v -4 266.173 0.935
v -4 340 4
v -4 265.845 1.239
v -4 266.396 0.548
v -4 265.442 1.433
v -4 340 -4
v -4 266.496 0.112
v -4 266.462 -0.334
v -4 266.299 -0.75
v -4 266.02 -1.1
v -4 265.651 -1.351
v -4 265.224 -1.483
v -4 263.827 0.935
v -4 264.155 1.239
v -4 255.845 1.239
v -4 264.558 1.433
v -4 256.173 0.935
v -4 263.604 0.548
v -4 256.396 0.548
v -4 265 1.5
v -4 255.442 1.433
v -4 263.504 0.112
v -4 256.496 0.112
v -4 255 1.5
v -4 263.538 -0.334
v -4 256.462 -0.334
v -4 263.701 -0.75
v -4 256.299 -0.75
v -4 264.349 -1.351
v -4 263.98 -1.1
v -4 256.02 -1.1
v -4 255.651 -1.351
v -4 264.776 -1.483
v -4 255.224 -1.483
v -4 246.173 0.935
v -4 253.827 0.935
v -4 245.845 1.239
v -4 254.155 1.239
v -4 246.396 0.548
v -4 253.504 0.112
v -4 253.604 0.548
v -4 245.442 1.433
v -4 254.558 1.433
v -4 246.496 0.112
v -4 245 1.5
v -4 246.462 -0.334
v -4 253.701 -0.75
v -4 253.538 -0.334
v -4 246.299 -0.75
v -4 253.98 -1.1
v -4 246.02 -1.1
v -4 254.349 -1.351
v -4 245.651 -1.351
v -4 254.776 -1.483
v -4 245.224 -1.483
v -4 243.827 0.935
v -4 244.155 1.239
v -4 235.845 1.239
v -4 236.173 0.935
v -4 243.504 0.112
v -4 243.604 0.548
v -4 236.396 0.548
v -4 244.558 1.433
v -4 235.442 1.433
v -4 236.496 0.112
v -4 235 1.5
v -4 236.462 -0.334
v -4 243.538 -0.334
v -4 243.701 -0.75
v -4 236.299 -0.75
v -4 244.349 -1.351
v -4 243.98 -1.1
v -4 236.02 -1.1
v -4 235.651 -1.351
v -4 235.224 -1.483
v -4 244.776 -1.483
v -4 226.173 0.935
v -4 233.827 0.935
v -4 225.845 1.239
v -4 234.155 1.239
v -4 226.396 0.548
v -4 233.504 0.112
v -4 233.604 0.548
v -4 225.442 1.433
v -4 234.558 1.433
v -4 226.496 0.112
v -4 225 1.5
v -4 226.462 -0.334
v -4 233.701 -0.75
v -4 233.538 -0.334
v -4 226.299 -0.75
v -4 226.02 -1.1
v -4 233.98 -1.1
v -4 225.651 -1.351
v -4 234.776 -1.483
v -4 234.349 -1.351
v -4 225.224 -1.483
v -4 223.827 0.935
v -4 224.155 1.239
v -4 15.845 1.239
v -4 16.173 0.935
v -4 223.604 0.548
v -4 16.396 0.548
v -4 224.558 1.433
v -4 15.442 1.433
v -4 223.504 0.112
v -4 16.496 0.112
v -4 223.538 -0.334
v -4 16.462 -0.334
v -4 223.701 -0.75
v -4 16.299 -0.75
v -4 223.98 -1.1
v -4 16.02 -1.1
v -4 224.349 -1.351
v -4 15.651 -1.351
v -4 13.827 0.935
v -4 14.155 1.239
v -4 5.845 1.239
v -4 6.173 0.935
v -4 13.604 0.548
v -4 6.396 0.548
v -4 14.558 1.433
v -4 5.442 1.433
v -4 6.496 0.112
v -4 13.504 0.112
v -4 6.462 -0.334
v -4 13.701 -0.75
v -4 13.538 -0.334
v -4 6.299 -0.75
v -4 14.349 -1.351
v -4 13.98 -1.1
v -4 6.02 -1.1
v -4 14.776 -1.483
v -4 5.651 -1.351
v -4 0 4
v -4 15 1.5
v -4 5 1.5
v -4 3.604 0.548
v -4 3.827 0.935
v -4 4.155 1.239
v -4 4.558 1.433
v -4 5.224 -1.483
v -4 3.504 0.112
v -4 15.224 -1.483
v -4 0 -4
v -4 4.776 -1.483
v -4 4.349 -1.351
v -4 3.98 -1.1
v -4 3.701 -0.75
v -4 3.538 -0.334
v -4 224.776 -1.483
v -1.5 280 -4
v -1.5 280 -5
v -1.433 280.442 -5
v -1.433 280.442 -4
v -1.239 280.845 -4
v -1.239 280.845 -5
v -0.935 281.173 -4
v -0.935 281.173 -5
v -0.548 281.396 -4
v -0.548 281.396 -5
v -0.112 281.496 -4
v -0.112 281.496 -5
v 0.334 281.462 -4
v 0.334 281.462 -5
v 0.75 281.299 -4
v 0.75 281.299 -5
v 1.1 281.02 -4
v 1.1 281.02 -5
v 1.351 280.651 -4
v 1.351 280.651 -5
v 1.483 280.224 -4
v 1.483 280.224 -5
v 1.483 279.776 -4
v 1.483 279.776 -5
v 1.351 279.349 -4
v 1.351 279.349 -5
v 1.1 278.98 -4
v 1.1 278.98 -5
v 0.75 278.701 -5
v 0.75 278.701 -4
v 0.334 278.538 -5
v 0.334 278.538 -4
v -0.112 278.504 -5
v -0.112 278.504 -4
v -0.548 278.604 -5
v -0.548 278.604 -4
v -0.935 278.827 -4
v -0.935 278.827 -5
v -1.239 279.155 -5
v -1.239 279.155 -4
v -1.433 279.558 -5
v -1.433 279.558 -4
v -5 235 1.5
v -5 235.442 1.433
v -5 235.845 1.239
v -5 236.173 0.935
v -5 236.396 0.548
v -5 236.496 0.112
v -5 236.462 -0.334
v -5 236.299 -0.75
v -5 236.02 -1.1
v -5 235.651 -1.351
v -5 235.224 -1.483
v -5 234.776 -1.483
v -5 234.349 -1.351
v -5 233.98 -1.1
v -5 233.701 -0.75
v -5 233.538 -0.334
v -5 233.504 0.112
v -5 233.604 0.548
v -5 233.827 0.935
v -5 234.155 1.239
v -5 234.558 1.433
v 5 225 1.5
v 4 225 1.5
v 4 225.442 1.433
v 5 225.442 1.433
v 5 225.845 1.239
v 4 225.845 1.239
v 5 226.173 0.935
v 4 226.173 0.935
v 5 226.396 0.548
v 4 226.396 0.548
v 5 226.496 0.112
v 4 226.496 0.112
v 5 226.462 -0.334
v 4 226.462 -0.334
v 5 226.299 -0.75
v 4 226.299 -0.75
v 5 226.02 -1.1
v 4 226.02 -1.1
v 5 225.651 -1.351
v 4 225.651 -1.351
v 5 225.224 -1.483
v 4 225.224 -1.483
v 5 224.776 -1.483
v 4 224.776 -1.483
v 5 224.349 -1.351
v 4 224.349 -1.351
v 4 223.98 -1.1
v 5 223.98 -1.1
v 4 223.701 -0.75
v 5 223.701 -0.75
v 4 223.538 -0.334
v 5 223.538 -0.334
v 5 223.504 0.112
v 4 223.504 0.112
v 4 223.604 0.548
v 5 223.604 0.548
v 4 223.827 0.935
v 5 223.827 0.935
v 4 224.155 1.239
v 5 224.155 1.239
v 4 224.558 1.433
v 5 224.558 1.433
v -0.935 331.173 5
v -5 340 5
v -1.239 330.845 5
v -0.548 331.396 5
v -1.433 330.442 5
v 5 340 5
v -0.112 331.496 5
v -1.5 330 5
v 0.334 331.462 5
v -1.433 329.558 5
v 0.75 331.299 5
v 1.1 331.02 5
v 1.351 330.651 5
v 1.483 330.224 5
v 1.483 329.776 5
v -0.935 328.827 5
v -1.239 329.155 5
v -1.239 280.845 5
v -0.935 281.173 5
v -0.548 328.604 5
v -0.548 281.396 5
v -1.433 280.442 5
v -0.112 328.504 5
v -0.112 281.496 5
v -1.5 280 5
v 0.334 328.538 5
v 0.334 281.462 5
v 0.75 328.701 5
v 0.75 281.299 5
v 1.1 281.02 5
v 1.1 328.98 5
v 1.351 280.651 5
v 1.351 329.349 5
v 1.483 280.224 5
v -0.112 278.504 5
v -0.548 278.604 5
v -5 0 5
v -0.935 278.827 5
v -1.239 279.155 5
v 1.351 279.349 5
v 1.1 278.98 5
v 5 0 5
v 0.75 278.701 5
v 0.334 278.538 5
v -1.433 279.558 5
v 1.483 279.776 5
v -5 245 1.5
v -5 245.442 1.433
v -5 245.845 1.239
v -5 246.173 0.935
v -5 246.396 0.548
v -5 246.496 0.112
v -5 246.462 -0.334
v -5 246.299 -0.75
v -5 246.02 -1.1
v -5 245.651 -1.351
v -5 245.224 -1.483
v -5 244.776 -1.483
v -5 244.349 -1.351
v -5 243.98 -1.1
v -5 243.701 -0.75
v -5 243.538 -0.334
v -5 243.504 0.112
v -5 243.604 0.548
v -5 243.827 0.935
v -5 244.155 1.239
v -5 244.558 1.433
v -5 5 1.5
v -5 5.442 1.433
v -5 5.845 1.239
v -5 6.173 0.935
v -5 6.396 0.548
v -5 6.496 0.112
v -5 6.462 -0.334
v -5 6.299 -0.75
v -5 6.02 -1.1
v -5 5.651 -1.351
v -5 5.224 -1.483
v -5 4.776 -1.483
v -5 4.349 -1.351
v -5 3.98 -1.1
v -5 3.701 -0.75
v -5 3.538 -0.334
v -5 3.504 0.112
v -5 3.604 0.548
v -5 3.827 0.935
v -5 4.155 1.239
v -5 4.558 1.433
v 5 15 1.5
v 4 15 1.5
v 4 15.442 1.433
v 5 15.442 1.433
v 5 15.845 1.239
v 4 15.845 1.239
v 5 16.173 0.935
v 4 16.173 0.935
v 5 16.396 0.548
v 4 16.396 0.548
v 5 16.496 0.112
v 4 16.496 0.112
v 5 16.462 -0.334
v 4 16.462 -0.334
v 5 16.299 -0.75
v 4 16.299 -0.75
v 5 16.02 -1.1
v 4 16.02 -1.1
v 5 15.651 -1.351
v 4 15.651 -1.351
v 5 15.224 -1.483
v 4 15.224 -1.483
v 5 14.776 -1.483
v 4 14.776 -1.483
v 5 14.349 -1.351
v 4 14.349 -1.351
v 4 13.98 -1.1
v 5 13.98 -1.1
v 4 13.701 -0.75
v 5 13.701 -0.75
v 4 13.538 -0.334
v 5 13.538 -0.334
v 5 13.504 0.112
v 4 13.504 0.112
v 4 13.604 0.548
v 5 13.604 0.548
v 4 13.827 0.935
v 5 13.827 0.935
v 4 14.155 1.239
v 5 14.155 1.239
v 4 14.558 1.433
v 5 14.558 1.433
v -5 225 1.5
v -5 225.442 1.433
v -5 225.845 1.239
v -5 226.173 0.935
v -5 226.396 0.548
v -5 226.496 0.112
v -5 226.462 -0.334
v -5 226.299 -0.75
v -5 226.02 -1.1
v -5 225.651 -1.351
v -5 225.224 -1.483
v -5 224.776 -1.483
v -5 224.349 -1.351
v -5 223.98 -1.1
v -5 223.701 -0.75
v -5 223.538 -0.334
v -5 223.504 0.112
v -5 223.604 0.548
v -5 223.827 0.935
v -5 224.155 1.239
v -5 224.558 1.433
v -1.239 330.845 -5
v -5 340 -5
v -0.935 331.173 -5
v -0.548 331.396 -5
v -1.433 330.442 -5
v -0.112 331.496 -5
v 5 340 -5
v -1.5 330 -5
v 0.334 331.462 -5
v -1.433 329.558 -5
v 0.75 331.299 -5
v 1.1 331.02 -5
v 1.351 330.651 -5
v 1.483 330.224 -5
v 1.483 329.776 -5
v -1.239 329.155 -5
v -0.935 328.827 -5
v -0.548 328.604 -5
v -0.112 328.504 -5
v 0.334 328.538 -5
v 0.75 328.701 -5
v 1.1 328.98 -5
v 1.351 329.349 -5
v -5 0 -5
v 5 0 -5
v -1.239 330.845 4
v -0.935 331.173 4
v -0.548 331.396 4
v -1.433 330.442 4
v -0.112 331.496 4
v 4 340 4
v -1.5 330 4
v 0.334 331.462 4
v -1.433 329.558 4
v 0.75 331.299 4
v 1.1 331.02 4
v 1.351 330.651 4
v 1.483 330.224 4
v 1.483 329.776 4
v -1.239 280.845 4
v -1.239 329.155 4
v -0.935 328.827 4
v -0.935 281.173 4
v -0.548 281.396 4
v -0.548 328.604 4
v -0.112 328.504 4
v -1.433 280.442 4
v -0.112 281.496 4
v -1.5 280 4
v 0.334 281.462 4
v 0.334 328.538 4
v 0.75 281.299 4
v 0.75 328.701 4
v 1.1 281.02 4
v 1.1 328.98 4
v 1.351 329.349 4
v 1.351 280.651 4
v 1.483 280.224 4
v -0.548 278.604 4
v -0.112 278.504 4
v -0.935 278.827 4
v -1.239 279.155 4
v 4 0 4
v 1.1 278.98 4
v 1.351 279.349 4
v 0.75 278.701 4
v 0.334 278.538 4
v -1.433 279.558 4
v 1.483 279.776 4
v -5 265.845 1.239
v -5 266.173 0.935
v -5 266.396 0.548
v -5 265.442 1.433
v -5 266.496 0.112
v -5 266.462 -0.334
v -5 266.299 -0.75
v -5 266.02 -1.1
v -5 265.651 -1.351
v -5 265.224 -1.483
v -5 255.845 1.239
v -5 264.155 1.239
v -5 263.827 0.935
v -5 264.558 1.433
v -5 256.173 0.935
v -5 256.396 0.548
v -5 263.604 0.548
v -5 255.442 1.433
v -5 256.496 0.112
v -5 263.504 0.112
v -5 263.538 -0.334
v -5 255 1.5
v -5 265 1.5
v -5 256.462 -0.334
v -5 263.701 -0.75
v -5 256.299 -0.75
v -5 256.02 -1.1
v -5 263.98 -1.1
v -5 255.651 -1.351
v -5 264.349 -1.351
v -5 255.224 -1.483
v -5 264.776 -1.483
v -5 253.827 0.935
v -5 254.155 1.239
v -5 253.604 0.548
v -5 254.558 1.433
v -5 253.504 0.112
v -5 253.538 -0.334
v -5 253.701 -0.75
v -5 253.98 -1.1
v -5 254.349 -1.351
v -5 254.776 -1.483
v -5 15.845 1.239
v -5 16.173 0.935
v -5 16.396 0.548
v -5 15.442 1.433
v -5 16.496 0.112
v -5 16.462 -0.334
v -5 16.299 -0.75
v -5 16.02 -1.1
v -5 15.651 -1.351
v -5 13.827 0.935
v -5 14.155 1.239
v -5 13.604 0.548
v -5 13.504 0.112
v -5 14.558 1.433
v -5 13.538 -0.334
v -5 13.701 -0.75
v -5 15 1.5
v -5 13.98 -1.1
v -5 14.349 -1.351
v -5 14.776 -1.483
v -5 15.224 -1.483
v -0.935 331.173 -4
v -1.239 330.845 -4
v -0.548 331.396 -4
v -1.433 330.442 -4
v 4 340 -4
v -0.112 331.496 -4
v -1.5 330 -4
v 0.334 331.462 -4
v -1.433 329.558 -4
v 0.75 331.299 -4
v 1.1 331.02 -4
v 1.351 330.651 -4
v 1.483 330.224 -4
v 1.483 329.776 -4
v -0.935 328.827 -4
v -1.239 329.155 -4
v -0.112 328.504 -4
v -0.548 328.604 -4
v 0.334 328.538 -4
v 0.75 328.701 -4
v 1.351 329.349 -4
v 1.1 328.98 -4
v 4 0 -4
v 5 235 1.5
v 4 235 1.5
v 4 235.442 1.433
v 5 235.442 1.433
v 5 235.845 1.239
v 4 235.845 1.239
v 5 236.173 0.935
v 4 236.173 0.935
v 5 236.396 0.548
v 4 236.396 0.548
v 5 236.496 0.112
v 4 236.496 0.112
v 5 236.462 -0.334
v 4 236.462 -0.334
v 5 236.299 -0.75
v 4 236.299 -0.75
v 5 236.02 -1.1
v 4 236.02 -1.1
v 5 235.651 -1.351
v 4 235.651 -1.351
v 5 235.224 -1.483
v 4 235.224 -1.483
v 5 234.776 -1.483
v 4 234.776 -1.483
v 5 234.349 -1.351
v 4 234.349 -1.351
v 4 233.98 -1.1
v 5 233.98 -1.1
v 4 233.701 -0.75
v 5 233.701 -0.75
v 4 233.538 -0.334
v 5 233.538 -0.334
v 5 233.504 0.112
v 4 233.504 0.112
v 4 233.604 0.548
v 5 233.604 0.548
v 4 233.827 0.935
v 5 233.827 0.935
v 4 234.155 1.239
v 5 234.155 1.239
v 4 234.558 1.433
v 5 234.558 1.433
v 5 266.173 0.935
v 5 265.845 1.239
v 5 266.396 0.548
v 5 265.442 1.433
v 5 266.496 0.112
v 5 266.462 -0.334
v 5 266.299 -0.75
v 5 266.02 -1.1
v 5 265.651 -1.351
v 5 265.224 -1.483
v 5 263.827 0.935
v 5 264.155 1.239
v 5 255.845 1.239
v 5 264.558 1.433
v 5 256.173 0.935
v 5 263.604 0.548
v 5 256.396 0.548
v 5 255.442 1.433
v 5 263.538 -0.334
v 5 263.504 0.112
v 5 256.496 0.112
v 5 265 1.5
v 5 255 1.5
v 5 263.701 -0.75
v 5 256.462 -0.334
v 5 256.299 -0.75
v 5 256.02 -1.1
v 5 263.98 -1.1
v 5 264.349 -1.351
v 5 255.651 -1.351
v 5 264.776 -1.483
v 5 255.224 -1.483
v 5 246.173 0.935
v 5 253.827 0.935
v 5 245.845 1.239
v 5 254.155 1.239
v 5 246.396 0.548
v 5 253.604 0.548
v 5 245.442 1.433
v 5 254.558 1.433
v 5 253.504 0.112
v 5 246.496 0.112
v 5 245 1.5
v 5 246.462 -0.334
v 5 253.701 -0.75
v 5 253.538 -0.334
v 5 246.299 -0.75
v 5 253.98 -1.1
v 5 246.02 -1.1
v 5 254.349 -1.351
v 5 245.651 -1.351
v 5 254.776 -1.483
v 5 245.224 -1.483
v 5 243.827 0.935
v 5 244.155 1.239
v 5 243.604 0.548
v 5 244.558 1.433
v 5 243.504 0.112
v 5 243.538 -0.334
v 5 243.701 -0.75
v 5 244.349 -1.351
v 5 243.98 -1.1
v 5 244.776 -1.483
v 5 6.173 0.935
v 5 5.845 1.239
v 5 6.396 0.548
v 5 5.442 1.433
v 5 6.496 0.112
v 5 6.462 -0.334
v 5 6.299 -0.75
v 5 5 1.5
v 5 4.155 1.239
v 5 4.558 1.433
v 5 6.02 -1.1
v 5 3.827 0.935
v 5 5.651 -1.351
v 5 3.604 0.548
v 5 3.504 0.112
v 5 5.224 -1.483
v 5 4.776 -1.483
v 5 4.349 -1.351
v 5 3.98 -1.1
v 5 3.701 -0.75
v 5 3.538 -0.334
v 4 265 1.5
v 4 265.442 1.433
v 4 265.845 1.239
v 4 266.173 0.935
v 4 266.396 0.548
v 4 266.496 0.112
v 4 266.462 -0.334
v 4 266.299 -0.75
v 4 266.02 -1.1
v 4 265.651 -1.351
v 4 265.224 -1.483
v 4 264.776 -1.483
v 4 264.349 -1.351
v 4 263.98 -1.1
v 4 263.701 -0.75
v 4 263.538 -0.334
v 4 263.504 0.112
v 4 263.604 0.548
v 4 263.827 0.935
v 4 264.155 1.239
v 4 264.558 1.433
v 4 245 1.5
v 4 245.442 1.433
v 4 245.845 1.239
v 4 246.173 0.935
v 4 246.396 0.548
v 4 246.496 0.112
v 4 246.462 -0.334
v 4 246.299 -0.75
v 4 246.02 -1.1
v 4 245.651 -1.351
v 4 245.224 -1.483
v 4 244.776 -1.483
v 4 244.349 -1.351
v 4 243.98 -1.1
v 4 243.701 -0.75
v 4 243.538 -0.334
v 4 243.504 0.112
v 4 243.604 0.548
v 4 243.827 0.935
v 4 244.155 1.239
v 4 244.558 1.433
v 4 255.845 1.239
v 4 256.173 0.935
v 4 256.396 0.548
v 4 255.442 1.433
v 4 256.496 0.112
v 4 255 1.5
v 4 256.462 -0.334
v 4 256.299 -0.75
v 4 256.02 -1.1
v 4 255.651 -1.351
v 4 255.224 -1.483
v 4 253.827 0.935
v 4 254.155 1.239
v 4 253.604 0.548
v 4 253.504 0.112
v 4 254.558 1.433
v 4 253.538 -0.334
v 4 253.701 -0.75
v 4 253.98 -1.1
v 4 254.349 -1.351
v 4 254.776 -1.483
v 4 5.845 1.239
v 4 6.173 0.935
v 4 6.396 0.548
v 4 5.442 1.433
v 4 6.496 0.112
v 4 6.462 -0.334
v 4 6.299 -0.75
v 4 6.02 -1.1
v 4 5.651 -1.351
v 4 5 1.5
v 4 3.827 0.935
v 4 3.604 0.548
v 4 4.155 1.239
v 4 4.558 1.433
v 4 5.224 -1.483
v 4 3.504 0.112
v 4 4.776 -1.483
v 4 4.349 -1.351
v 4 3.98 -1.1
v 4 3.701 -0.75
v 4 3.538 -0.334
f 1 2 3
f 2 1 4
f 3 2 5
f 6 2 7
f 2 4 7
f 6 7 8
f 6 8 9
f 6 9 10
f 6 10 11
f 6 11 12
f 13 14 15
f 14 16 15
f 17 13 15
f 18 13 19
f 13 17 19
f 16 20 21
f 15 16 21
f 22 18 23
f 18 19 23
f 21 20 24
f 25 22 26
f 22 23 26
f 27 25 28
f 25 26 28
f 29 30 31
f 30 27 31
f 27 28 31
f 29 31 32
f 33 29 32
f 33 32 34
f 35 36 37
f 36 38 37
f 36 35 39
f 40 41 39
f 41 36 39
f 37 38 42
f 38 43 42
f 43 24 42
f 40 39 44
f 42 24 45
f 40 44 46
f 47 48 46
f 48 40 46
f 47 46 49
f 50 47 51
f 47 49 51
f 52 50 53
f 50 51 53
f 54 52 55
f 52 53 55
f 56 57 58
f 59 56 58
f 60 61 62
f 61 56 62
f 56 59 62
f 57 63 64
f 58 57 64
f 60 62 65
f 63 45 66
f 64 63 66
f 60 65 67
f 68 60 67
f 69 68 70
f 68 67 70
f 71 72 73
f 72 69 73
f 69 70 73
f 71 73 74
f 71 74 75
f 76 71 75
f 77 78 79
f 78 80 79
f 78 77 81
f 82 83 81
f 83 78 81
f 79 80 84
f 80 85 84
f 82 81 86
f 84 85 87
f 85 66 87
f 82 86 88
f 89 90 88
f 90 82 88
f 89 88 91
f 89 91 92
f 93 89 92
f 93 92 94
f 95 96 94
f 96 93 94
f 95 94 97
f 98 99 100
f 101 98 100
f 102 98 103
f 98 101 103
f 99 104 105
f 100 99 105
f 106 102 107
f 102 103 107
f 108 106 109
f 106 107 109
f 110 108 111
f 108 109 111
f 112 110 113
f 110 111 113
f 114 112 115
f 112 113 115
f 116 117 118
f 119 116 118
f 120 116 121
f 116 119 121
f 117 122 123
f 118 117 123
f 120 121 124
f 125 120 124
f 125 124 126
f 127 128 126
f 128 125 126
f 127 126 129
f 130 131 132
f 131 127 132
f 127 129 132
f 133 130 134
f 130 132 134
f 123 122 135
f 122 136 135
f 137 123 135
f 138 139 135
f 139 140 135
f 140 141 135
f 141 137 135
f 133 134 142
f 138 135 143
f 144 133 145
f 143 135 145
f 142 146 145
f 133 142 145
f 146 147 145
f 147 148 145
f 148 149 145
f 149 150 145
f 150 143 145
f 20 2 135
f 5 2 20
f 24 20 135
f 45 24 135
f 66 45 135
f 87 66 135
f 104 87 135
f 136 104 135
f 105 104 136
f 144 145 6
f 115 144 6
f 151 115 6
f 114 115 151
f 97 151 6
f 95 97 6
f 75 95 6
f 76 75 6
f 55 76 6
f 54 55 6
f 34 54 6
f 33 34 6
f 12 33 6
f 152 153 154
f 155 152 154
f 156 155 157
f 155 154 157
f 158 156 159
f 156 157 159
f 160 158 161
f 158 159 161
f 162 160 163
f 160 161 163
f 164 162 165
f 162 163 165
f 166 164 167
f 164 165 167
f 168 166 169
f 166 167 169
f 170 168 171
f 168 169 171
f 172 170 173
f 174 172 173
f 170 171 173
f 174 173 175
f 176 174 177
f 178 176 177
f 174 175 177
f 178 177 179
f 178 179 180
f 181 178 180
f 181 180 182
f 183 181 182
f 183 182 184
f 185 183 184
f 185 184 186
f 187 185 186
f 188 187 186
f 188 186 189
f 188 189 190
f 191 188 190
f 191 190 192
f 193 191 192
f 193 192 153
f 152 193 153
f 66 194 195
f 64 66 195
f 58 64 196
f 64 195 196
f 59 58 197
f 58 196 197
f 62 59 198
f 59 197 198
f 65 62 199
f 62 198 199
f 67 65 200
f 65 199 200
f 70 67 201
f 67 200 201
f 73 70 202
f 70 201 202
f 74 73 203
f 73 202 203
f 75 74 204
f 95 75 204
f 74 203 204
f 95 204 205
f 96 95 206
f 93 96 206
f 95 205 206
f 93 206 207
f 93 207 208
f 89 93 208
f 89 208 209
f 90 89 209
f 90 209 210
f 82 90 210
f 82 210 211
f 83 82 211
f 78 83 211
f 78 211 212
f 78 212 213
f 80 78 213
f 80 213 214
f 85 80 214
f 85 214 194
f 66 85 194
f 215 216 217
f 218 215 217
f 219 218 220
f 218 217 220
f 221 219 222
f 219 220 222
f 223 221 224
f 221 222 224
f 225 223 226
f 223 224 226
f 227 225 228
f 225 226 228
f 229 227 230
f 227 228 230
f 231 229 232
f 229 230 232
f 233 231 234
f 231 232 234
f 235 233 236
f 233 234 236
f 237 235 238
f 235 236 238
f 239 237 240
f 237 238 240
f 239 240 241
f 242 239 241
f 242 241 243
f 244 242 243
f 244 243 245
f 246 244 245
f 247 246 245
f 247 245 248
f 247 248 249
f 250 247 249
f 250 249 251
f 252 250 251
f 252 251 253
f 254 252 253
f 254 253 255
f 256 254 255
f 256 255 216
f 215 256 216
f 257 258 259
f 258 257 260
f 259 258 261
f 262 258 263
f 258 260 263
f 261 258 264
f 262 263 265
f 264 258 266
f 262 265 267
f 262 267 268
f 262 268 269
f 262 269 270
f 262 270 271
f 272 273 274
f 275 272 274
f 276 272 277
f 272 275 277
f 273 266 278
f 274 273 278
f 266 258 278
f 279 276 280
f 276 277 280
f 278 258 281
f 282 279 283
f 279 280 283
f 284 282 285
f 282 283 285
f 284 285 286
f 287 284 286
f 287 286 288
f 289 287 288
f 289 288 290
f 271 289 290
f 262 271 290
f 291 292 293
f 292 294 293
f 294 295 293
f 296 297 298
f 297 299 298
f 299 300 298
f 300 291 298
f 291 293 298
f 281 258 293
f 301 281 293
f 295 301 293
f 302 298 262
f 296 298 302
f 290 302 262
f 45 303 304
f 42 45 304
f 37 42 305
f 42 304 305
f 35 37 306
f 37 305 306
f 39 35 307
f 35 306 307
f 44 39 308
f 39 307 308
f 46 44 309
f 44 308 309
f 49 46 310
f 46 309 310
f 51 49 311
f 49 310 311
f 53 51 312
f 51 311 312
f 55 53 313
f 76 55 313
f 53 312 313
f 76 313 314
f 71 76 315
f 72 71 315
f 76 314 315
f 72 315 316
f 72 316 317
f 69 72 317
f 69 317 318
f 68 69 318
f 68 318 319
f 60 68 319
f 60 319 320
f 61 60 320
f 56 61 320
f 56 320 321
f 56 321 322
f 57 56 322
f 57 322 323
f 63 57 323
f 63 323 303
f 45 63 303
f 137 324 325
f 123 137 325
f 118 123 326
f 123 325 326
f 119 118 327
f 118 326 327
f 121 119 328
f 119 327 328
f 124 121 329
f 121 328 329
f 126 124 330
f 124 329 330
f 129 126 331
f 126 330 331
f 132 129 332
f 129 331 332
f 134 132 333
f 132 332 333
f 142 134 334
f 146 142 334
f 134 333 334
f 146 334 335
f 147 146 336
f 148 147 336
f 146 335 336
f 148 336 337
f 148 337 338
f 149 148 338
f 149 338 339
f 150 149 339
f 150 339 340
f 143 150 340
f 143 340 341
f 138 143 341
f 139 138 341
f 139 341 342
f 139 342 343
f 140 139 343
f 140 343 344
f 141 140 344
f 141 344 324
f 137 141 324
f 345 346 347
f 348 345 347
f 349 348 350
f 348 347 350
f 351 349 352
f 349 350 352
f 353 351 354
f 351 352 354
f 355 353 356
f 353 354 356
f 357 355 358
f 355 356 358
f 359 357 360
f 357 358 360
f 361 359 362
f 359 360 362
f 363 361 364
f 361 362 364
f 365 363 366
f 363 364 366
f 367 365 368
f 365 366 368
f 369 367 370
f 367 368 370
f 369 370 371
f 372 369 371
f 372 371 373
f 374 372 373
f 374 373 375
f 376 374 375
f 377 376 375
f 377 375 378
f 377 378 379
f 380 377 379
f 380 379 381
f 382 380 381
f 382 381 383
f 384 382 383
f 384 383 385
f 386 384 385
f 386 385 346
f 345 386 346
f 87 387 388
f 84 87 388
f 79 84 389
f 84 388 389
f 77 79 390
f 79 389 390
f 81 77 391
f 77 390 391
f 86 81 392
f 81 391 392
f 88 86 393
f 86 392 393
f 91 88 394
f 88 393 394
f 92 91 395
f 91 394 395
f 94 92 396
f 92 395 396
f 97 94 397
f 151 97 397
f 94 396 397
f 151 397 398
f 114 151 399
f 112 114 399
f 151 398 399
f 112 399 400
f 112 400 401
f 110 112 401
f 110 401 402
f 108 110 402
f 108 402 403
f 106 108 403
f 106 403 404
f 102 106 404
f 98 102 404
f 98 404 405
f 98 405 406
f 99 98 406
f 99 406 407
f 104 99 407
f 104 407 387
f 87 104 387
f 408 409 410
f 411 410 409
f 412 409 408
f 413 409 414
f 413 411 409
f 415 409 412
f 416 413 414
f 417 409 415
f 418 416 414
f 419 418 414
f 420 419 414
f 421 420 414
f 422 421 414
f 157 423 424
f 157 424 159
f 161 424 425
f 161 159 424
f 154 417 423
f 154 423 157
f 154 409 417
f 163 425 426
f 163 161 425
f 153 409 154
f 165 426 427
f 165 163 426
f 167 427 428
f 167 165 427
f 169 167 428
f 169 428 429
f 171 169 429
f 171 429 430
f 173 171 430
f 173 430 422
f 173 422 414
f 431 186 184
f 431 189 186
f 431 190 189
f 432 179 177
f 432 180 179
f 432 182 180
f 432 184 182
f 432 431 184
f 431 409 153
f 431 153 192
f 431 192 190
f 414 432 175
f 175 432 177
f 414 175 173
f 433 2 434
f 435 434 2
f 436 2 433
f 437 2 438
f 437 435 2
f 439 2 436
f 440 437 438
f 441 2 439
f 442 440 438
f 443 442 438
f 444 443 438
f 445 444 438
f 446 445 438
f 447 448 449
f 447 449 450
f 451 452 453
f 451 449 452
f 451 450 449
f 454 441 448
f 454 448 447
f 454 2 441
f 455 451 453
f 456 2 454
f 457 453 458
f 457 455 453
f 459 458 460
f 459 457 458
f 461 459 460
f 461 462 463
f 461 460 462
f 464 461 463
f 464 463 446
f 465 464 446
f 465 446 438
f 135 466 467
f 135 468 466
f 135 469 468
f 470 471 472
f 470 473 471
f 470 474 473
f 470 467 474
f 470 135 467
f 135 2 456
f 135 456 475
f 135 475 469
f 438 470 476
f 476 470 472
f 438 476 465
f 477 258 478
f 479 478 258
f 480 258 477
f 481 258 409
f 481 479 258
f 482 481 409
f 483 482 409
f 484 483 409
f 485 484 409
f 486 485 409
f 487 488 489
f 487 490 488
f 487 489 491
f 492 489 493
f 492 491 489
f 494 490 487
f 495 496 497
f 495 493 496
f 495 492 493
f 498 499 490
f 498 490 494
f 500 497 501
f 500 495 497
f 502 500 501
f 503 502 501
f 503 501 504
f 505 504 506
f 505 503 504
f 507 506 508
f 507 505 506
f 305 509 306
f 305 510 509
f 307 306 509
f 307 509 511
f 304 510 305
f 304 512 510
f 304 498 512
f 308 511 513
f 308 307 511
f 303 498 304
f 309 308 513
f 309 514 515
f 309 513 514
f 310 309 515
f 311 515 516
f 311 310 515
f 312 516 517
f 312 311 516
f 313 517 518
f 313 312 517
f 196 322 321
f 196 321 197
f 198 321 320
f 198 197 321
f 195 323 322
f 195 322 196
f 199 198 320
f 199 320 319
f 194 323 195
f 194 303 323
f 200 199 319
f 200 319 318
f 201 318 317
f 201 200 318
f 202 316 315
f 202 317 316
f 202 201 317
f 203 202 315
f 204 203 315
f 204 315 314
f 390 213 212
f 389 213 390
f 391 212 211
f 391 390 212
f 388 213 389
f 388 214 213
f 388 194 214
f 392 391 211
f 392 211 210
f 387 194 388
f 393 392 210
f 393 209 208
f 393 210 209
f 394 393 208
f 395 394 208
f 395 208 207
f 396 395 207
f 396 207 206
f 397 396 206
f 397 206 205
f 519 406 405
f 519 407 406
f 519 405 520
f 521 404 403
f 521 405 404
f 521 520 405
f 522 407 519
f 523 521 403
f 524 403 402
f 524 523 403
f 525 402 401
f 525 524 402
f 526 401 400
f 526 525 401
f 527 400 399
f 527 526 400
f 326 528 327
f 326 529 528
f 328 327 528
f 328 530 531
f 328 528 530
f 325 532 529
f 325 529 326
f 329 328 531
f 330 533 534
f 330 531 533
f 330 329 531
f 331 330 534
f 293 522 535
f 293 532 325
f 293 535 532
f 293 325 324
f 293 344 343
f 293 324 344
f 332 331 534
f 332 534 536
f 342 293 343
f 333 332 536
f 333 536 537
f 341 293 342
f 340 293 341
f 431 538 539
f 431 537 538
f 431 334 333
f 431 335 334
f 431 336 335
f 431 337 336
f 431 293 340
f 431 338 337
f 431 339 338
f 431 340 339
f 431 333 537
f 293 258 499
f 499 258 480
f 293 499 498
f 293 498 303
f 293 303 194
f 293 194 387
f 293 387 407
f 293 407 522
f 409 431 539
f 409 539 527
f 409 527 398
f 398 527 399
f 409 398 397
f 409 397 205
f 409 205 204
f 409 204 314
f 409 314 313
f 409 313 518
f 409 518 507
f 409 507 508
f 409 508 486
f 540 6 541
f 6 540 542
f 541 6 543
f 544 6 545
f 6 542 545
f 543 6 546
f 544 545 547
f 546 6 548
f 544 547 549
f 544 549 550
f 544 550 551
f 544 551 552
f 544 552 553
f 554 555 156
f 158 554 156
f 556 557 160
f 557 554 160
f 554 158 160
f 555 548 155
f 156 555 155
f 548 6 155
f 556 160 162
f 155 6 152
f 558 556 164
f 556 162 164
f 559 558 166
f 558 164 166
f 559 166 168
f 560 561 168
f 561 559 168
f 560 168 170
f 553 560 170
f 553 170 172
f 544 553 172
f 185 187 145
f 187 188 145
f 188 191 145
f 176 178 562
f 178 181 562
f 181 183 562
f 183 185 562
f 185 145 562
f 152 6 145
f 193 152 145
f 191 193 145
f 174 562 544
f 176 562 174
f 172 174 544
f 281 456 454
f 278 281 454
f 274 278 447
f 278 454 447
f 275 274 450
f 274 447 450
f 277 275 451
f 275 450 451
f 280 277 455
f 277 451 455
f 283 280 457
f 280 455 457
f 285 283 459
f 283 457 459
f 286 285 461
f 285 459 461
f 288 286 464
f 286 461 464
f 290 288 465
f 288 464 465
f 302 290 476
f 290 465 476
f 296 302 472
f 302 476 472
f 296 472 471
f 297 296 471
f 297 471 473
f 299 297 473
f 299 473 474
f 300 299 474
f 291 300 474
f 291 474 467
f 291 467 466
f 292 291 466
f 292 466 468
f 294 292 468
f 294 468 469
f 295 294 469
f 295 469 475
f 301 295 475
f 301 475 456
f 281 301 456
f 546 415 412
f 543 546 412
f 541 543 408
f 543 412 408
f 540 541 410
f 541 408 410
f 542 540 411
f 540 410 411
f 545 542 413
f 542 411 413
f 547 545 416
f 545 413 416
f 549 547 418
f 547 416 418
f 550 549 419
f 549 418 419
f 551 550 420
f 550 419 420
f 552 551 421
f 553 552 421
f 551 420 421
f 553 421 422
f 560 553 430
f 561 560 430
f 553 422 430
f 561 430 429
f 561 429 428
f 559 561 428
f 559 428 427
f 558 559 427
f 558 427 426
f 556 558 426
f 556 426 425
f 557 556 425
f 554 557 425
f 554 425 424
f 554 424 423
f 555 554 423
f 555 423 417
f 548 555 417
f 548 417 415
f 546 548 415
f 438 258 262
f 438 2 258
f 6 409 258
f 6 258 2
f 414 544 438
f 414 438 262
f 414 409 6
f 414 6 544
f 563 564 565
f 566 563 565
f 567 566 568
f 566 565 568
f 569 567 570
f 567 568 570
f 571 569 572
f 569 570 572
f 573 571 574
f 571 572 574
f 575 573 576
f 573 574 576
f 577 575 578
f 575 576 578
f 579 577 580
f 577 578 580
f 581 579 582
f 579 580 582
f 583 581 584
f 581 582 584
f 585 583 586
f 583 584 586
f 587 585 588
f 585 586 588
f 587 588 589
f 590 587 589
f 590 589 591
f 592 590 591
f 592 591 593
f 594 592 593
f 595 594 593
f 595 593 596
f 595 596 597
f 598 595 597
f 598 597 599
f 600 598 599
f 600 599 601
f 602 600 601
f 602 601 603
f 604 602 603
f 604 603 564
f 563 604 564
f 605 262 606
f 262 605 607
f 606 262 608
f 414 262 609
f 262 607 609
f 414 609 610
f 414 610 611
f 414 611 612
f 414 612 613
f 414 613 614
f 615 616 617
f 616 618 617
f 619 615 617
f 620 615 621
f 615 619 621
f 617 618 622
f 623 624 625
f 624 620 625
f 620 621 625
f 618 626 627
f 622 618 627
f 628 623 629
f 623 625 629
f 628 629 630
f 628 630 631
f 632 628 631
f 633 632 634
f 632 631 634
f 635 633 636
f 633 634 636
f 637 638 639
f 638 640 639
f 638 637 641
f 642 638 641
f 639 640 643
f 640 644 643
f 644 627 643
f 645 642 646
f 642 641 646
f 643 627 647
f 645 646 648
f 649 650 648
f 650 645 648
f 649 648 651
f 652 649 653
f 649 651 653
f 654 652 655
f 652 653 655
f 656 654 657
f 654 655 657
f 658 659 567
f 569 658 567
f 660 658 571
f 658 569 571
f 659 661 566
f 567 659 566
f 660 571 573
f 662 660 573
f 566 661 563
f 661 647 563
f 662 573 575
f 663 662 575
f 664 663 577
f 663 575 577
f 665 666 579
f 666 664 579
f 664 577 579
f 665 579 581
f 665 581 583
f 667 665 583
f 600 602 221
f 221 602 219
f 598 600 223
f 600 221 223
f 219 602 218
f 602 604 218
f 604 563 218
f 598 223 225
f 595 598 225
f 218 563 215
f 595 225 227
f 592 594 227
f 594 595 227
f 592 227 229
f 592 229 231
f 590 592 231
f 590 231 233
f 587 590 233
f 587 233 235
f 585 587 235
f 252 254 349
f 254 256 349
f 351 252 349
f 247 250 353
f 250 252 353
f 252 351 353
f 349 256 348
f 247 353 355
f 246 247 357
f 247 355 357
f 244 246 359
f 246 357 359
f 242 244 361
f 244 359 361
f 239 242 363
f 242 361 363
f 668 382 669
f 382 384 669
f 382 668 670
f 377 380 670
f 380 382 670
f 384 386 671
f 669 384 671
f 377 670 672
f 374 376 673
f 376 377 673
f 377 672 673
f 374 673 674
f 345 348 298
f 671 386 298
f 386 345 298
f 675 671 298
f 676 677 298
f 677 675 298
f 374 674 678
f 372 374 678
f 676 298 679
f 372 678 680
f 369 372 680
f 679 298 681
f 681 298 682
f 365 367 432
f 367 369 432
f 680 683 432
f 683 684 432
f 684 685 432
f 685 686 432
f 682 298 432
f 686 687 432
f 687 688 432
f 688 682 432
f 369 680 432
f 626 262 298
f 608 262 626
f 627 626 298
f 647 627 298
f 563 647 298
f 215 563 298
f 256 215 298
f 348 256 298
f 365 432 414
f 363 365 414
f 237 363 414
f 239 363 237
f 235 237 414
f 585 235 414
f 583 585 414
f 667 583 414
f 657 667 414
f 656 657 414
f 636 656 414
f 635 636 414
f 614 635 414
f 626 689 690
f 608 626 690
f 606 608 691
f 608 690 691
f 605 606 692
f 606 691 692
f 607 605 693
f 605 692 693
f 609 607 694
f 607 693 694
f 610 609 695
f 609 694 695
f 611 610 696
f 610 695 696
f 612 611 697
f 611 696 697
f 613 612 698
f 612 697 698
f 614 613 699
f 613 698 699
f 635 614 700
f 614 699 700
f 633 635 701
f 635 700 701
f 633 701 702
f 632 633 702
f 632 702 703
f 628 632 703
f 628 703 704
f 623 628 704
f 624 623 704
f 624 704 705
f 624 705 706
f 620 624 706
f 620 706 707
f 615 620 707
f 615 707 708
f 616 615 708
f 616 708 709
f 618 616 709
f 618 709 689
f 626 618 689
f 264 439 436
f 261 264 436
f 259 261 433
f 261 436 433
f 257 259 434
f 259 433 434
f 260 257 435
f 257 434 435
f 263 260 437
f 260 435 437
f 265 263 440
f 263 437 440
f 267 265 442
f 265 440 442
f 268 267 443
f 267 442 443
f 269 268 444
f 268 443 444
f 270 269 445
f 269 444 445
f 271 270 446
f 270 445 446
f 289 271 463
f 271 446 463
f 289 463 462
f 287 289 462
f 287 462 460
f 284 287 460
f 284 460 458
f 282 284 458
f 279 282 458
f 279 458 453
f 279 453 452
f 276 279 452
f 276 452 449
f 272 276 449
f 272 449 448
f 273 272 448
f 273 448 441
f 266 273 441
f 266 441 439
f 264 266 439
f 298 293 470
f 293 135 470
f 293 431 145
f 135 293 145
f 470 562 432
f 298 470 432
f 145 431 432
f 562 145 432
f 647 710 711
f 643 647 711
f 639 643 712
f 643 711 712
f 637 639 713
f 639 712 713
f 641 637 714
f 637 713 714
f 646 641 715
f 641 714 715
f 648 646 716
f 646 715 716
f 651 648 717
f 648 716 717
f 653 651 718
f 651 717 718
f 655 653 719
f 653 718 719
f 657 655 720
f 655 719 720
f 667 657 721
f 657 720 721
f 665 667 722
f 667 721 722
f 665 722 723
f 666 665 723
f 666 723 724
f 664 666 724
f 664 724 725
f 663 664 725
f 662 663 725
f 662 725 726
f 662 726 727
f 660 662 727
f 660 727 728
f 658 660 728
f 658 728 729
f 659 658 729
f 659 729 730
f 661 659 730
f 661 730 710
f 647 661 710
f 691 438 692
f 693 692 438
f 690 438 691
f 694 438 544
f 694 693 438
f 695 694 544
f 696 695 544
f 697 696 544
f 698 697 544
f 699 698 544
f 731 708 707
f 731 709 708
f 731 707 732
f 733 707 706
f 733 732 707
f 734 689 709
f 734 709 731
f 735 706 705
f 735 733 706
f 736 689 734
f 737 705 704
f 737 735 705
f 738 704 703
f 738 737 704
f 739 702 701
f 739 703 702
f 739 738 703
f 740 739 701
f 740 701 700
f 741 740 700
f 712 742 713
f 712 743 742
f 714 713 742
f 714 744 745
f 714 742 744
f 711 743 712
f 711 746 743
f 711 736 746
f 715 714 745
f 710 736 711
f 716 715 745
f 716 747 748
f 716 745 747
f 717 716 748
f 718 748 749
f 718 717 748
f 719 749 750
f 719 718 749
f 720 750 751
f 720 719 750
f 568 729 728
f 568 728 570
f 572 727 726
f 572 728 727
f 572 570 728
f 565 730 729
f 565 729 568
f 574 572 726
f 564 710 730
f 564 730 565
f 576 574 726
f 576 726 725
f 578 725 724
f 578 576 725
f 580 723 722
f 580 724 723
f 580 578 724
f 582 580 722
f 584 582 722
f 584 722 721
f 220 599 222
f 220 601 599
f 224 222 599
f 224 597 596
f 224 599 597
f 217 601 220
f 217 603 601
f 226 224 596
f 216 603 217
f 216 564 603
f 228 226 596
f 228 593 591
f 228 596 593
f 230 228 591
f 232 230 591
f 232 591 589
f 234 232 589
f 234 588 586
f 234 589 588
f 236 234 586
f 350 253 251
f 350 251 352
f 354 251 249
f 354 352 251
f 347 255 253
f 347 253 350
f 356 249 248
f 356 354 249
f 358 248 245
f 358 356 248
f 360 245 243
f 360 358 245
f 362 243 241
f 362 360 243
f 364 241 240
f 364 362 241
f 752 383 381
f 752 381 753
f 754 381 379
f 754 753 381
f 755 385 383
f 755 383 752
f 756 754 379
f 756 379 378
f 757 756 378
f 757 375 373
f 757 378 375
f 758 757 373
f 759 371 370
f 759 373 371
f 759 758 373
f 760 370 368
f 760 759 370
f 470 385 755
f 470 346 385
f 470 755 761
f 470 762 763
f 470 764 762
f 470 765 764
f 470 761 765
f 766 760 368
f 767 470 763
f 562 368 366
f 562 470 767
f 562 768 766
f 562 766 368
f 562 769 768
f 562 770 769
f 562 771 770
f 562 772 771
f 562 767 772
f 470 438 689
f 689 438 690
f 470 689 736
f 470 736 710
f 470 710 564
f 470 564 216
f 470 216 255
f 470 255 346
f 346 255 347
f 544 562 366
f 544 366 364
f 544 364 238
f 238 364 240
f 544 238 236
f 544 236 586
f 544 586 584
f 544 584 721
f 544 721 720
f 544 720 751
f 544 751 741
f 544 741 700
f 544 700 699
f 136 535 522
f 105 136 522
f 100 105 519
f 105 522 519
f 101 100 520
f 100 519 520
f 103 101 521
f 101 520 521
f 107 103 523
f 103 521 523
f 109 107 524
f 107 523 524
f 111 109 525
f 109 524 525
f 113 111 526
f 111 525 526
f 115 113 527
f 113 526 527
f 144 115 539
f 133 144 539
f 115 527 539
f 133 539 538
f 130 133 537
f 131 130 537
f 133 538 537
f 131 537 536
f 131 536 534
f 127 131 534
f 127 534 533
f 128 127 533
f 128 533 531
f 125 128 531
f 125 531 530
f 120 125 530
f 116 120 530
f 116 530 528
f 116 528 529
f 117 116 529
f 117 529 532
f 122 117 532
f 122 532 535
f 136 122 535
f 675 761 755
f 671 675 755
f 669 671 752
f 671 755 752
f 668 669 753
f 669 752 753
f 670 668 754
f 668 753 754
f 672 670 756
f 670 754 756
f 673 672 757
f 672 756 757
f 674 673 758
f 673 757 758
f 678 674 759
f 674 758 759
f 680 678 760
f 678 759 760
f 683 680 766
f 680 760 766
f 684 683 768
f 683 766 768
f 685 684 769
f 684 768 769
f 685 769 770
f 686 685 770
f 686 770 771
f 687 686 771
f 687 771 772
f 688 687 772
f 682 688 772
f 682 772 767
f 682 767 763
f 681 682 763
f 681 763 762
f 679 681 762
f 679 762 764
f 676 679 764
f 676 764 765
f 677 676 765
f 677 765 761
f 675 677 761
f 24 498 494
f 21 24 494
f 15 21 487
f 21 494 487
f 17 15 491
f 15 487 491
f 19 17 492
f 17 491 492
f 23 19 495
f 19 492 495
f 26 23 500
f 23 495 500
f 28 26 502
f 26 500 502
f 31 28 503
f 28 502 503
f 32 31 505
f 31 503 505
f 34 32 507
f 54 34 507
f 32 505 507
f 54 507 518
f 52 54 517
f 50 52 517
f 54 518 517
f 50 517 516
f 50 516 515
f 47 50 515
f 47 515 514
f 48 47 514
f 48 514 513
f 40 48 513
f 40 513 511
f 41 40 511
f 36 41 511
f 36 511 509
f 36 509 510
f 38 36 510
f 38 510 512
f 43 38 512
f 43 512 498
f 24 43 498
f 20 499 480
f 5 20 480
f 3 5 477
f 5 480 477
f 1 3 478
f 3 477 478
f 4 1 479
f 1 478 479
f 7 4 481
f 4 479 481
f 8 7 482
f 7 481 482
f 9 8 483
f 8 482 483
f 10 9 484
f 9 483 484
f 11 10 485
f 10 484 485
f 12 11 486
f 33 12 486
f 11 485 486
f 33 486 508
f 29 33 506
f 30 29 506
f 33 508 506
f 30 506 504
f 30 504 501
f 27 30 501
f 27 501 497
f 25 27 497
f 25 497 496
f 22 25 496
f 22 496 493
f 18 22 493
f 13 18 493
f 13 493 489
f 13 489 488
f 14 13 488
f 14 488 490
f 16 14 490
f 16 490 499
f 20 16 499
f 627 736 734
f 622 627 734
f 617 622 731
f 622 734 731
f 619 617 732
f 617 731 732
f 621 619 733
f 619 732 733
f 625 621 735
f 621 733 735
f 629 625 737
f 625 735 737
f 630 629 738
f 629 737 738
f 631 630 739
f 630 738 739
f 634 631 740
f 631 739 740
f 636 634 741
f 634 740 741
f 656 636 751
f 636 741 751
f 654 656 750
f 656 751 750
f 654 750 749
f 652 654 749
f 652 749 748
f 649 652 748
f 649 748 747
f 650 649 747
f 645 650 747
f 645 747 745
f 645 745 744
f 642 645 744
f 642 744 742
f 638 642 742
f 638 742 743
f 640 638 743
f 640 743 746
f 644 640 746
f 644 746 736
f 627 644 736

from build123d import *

# Parameters (mm, degrees)
SKETCH_1_W          = 10
SKETCH_1_H          = 10
SKETCH_1_W_2        = 8
SKETCH_1_H_2        = 8
EXTRUDE_1_DEPTH     = 340
SKETCH_2_R          = 1.5
CUT_EXTRUDE_1_DEPTH = 30
SKETCH_3_R          = 1.5
CUT_EXTRUDE_2_DEPTH = 10


with BuildPart() as part:
    # 草图1 → 凸台-拉伸1 (new body)
    with BuildSketch(Plane(origin=(0, 0, 0), x_dir=(1, 0, 0), z_dir=(0, 1, 0))):
        Rectangle(SKETCH_1_W, SKETCH_1_H)
        Rectangle(SKETCH_1_W_2, SKETCH_1_H_2, mode=Mode.SUBTRACT)
    extrude(amount=EXTRUDE_1_DEPTH)

    # 草图2 → 切除-拉伸1 (cut)
    with BuildSketch(Plane.ZY.offset(5)):
        with Locations((0, 5)):
            Circle(SKETCH_2_R)
        with Locations((0, 15)):
            Circle(SKETCH_2_R)
        with Locations((0, 225)):
            Circle(SKETCH_2_R)
        with Locations((0, 235)):
            Circle(SKETCH_2_R)
        with Locations((0, 245)):
            Circle(SKETCH_2_R)
        with Locations((0, 255)):
            Circle(SKETCH_2_R)
        with Locations((0, 265)):
            Circle(SKETCH_2_R)
    extrude(amount=-CUT_EXTRUDE_1_DEPTH, mode=Mode.SUBTRACT)

    # 草图3 → 切除-拉伸2 (cut)
    with BuildSketch(Plane(origin=(0, 0, -5), x_dir=(-1, 0, 0), z_dir=(0, 0, -1))):
        with Locations((0, 280)):
            Circle(SKETCH_3_R)
        with Locations((0, 330)):
            Circle(SKETCH_3_R)
    extrude(amount=-CUT_EXTRUDE_2_DEPTH, mode=Mode.SUBTRACT)


solid = part.part
